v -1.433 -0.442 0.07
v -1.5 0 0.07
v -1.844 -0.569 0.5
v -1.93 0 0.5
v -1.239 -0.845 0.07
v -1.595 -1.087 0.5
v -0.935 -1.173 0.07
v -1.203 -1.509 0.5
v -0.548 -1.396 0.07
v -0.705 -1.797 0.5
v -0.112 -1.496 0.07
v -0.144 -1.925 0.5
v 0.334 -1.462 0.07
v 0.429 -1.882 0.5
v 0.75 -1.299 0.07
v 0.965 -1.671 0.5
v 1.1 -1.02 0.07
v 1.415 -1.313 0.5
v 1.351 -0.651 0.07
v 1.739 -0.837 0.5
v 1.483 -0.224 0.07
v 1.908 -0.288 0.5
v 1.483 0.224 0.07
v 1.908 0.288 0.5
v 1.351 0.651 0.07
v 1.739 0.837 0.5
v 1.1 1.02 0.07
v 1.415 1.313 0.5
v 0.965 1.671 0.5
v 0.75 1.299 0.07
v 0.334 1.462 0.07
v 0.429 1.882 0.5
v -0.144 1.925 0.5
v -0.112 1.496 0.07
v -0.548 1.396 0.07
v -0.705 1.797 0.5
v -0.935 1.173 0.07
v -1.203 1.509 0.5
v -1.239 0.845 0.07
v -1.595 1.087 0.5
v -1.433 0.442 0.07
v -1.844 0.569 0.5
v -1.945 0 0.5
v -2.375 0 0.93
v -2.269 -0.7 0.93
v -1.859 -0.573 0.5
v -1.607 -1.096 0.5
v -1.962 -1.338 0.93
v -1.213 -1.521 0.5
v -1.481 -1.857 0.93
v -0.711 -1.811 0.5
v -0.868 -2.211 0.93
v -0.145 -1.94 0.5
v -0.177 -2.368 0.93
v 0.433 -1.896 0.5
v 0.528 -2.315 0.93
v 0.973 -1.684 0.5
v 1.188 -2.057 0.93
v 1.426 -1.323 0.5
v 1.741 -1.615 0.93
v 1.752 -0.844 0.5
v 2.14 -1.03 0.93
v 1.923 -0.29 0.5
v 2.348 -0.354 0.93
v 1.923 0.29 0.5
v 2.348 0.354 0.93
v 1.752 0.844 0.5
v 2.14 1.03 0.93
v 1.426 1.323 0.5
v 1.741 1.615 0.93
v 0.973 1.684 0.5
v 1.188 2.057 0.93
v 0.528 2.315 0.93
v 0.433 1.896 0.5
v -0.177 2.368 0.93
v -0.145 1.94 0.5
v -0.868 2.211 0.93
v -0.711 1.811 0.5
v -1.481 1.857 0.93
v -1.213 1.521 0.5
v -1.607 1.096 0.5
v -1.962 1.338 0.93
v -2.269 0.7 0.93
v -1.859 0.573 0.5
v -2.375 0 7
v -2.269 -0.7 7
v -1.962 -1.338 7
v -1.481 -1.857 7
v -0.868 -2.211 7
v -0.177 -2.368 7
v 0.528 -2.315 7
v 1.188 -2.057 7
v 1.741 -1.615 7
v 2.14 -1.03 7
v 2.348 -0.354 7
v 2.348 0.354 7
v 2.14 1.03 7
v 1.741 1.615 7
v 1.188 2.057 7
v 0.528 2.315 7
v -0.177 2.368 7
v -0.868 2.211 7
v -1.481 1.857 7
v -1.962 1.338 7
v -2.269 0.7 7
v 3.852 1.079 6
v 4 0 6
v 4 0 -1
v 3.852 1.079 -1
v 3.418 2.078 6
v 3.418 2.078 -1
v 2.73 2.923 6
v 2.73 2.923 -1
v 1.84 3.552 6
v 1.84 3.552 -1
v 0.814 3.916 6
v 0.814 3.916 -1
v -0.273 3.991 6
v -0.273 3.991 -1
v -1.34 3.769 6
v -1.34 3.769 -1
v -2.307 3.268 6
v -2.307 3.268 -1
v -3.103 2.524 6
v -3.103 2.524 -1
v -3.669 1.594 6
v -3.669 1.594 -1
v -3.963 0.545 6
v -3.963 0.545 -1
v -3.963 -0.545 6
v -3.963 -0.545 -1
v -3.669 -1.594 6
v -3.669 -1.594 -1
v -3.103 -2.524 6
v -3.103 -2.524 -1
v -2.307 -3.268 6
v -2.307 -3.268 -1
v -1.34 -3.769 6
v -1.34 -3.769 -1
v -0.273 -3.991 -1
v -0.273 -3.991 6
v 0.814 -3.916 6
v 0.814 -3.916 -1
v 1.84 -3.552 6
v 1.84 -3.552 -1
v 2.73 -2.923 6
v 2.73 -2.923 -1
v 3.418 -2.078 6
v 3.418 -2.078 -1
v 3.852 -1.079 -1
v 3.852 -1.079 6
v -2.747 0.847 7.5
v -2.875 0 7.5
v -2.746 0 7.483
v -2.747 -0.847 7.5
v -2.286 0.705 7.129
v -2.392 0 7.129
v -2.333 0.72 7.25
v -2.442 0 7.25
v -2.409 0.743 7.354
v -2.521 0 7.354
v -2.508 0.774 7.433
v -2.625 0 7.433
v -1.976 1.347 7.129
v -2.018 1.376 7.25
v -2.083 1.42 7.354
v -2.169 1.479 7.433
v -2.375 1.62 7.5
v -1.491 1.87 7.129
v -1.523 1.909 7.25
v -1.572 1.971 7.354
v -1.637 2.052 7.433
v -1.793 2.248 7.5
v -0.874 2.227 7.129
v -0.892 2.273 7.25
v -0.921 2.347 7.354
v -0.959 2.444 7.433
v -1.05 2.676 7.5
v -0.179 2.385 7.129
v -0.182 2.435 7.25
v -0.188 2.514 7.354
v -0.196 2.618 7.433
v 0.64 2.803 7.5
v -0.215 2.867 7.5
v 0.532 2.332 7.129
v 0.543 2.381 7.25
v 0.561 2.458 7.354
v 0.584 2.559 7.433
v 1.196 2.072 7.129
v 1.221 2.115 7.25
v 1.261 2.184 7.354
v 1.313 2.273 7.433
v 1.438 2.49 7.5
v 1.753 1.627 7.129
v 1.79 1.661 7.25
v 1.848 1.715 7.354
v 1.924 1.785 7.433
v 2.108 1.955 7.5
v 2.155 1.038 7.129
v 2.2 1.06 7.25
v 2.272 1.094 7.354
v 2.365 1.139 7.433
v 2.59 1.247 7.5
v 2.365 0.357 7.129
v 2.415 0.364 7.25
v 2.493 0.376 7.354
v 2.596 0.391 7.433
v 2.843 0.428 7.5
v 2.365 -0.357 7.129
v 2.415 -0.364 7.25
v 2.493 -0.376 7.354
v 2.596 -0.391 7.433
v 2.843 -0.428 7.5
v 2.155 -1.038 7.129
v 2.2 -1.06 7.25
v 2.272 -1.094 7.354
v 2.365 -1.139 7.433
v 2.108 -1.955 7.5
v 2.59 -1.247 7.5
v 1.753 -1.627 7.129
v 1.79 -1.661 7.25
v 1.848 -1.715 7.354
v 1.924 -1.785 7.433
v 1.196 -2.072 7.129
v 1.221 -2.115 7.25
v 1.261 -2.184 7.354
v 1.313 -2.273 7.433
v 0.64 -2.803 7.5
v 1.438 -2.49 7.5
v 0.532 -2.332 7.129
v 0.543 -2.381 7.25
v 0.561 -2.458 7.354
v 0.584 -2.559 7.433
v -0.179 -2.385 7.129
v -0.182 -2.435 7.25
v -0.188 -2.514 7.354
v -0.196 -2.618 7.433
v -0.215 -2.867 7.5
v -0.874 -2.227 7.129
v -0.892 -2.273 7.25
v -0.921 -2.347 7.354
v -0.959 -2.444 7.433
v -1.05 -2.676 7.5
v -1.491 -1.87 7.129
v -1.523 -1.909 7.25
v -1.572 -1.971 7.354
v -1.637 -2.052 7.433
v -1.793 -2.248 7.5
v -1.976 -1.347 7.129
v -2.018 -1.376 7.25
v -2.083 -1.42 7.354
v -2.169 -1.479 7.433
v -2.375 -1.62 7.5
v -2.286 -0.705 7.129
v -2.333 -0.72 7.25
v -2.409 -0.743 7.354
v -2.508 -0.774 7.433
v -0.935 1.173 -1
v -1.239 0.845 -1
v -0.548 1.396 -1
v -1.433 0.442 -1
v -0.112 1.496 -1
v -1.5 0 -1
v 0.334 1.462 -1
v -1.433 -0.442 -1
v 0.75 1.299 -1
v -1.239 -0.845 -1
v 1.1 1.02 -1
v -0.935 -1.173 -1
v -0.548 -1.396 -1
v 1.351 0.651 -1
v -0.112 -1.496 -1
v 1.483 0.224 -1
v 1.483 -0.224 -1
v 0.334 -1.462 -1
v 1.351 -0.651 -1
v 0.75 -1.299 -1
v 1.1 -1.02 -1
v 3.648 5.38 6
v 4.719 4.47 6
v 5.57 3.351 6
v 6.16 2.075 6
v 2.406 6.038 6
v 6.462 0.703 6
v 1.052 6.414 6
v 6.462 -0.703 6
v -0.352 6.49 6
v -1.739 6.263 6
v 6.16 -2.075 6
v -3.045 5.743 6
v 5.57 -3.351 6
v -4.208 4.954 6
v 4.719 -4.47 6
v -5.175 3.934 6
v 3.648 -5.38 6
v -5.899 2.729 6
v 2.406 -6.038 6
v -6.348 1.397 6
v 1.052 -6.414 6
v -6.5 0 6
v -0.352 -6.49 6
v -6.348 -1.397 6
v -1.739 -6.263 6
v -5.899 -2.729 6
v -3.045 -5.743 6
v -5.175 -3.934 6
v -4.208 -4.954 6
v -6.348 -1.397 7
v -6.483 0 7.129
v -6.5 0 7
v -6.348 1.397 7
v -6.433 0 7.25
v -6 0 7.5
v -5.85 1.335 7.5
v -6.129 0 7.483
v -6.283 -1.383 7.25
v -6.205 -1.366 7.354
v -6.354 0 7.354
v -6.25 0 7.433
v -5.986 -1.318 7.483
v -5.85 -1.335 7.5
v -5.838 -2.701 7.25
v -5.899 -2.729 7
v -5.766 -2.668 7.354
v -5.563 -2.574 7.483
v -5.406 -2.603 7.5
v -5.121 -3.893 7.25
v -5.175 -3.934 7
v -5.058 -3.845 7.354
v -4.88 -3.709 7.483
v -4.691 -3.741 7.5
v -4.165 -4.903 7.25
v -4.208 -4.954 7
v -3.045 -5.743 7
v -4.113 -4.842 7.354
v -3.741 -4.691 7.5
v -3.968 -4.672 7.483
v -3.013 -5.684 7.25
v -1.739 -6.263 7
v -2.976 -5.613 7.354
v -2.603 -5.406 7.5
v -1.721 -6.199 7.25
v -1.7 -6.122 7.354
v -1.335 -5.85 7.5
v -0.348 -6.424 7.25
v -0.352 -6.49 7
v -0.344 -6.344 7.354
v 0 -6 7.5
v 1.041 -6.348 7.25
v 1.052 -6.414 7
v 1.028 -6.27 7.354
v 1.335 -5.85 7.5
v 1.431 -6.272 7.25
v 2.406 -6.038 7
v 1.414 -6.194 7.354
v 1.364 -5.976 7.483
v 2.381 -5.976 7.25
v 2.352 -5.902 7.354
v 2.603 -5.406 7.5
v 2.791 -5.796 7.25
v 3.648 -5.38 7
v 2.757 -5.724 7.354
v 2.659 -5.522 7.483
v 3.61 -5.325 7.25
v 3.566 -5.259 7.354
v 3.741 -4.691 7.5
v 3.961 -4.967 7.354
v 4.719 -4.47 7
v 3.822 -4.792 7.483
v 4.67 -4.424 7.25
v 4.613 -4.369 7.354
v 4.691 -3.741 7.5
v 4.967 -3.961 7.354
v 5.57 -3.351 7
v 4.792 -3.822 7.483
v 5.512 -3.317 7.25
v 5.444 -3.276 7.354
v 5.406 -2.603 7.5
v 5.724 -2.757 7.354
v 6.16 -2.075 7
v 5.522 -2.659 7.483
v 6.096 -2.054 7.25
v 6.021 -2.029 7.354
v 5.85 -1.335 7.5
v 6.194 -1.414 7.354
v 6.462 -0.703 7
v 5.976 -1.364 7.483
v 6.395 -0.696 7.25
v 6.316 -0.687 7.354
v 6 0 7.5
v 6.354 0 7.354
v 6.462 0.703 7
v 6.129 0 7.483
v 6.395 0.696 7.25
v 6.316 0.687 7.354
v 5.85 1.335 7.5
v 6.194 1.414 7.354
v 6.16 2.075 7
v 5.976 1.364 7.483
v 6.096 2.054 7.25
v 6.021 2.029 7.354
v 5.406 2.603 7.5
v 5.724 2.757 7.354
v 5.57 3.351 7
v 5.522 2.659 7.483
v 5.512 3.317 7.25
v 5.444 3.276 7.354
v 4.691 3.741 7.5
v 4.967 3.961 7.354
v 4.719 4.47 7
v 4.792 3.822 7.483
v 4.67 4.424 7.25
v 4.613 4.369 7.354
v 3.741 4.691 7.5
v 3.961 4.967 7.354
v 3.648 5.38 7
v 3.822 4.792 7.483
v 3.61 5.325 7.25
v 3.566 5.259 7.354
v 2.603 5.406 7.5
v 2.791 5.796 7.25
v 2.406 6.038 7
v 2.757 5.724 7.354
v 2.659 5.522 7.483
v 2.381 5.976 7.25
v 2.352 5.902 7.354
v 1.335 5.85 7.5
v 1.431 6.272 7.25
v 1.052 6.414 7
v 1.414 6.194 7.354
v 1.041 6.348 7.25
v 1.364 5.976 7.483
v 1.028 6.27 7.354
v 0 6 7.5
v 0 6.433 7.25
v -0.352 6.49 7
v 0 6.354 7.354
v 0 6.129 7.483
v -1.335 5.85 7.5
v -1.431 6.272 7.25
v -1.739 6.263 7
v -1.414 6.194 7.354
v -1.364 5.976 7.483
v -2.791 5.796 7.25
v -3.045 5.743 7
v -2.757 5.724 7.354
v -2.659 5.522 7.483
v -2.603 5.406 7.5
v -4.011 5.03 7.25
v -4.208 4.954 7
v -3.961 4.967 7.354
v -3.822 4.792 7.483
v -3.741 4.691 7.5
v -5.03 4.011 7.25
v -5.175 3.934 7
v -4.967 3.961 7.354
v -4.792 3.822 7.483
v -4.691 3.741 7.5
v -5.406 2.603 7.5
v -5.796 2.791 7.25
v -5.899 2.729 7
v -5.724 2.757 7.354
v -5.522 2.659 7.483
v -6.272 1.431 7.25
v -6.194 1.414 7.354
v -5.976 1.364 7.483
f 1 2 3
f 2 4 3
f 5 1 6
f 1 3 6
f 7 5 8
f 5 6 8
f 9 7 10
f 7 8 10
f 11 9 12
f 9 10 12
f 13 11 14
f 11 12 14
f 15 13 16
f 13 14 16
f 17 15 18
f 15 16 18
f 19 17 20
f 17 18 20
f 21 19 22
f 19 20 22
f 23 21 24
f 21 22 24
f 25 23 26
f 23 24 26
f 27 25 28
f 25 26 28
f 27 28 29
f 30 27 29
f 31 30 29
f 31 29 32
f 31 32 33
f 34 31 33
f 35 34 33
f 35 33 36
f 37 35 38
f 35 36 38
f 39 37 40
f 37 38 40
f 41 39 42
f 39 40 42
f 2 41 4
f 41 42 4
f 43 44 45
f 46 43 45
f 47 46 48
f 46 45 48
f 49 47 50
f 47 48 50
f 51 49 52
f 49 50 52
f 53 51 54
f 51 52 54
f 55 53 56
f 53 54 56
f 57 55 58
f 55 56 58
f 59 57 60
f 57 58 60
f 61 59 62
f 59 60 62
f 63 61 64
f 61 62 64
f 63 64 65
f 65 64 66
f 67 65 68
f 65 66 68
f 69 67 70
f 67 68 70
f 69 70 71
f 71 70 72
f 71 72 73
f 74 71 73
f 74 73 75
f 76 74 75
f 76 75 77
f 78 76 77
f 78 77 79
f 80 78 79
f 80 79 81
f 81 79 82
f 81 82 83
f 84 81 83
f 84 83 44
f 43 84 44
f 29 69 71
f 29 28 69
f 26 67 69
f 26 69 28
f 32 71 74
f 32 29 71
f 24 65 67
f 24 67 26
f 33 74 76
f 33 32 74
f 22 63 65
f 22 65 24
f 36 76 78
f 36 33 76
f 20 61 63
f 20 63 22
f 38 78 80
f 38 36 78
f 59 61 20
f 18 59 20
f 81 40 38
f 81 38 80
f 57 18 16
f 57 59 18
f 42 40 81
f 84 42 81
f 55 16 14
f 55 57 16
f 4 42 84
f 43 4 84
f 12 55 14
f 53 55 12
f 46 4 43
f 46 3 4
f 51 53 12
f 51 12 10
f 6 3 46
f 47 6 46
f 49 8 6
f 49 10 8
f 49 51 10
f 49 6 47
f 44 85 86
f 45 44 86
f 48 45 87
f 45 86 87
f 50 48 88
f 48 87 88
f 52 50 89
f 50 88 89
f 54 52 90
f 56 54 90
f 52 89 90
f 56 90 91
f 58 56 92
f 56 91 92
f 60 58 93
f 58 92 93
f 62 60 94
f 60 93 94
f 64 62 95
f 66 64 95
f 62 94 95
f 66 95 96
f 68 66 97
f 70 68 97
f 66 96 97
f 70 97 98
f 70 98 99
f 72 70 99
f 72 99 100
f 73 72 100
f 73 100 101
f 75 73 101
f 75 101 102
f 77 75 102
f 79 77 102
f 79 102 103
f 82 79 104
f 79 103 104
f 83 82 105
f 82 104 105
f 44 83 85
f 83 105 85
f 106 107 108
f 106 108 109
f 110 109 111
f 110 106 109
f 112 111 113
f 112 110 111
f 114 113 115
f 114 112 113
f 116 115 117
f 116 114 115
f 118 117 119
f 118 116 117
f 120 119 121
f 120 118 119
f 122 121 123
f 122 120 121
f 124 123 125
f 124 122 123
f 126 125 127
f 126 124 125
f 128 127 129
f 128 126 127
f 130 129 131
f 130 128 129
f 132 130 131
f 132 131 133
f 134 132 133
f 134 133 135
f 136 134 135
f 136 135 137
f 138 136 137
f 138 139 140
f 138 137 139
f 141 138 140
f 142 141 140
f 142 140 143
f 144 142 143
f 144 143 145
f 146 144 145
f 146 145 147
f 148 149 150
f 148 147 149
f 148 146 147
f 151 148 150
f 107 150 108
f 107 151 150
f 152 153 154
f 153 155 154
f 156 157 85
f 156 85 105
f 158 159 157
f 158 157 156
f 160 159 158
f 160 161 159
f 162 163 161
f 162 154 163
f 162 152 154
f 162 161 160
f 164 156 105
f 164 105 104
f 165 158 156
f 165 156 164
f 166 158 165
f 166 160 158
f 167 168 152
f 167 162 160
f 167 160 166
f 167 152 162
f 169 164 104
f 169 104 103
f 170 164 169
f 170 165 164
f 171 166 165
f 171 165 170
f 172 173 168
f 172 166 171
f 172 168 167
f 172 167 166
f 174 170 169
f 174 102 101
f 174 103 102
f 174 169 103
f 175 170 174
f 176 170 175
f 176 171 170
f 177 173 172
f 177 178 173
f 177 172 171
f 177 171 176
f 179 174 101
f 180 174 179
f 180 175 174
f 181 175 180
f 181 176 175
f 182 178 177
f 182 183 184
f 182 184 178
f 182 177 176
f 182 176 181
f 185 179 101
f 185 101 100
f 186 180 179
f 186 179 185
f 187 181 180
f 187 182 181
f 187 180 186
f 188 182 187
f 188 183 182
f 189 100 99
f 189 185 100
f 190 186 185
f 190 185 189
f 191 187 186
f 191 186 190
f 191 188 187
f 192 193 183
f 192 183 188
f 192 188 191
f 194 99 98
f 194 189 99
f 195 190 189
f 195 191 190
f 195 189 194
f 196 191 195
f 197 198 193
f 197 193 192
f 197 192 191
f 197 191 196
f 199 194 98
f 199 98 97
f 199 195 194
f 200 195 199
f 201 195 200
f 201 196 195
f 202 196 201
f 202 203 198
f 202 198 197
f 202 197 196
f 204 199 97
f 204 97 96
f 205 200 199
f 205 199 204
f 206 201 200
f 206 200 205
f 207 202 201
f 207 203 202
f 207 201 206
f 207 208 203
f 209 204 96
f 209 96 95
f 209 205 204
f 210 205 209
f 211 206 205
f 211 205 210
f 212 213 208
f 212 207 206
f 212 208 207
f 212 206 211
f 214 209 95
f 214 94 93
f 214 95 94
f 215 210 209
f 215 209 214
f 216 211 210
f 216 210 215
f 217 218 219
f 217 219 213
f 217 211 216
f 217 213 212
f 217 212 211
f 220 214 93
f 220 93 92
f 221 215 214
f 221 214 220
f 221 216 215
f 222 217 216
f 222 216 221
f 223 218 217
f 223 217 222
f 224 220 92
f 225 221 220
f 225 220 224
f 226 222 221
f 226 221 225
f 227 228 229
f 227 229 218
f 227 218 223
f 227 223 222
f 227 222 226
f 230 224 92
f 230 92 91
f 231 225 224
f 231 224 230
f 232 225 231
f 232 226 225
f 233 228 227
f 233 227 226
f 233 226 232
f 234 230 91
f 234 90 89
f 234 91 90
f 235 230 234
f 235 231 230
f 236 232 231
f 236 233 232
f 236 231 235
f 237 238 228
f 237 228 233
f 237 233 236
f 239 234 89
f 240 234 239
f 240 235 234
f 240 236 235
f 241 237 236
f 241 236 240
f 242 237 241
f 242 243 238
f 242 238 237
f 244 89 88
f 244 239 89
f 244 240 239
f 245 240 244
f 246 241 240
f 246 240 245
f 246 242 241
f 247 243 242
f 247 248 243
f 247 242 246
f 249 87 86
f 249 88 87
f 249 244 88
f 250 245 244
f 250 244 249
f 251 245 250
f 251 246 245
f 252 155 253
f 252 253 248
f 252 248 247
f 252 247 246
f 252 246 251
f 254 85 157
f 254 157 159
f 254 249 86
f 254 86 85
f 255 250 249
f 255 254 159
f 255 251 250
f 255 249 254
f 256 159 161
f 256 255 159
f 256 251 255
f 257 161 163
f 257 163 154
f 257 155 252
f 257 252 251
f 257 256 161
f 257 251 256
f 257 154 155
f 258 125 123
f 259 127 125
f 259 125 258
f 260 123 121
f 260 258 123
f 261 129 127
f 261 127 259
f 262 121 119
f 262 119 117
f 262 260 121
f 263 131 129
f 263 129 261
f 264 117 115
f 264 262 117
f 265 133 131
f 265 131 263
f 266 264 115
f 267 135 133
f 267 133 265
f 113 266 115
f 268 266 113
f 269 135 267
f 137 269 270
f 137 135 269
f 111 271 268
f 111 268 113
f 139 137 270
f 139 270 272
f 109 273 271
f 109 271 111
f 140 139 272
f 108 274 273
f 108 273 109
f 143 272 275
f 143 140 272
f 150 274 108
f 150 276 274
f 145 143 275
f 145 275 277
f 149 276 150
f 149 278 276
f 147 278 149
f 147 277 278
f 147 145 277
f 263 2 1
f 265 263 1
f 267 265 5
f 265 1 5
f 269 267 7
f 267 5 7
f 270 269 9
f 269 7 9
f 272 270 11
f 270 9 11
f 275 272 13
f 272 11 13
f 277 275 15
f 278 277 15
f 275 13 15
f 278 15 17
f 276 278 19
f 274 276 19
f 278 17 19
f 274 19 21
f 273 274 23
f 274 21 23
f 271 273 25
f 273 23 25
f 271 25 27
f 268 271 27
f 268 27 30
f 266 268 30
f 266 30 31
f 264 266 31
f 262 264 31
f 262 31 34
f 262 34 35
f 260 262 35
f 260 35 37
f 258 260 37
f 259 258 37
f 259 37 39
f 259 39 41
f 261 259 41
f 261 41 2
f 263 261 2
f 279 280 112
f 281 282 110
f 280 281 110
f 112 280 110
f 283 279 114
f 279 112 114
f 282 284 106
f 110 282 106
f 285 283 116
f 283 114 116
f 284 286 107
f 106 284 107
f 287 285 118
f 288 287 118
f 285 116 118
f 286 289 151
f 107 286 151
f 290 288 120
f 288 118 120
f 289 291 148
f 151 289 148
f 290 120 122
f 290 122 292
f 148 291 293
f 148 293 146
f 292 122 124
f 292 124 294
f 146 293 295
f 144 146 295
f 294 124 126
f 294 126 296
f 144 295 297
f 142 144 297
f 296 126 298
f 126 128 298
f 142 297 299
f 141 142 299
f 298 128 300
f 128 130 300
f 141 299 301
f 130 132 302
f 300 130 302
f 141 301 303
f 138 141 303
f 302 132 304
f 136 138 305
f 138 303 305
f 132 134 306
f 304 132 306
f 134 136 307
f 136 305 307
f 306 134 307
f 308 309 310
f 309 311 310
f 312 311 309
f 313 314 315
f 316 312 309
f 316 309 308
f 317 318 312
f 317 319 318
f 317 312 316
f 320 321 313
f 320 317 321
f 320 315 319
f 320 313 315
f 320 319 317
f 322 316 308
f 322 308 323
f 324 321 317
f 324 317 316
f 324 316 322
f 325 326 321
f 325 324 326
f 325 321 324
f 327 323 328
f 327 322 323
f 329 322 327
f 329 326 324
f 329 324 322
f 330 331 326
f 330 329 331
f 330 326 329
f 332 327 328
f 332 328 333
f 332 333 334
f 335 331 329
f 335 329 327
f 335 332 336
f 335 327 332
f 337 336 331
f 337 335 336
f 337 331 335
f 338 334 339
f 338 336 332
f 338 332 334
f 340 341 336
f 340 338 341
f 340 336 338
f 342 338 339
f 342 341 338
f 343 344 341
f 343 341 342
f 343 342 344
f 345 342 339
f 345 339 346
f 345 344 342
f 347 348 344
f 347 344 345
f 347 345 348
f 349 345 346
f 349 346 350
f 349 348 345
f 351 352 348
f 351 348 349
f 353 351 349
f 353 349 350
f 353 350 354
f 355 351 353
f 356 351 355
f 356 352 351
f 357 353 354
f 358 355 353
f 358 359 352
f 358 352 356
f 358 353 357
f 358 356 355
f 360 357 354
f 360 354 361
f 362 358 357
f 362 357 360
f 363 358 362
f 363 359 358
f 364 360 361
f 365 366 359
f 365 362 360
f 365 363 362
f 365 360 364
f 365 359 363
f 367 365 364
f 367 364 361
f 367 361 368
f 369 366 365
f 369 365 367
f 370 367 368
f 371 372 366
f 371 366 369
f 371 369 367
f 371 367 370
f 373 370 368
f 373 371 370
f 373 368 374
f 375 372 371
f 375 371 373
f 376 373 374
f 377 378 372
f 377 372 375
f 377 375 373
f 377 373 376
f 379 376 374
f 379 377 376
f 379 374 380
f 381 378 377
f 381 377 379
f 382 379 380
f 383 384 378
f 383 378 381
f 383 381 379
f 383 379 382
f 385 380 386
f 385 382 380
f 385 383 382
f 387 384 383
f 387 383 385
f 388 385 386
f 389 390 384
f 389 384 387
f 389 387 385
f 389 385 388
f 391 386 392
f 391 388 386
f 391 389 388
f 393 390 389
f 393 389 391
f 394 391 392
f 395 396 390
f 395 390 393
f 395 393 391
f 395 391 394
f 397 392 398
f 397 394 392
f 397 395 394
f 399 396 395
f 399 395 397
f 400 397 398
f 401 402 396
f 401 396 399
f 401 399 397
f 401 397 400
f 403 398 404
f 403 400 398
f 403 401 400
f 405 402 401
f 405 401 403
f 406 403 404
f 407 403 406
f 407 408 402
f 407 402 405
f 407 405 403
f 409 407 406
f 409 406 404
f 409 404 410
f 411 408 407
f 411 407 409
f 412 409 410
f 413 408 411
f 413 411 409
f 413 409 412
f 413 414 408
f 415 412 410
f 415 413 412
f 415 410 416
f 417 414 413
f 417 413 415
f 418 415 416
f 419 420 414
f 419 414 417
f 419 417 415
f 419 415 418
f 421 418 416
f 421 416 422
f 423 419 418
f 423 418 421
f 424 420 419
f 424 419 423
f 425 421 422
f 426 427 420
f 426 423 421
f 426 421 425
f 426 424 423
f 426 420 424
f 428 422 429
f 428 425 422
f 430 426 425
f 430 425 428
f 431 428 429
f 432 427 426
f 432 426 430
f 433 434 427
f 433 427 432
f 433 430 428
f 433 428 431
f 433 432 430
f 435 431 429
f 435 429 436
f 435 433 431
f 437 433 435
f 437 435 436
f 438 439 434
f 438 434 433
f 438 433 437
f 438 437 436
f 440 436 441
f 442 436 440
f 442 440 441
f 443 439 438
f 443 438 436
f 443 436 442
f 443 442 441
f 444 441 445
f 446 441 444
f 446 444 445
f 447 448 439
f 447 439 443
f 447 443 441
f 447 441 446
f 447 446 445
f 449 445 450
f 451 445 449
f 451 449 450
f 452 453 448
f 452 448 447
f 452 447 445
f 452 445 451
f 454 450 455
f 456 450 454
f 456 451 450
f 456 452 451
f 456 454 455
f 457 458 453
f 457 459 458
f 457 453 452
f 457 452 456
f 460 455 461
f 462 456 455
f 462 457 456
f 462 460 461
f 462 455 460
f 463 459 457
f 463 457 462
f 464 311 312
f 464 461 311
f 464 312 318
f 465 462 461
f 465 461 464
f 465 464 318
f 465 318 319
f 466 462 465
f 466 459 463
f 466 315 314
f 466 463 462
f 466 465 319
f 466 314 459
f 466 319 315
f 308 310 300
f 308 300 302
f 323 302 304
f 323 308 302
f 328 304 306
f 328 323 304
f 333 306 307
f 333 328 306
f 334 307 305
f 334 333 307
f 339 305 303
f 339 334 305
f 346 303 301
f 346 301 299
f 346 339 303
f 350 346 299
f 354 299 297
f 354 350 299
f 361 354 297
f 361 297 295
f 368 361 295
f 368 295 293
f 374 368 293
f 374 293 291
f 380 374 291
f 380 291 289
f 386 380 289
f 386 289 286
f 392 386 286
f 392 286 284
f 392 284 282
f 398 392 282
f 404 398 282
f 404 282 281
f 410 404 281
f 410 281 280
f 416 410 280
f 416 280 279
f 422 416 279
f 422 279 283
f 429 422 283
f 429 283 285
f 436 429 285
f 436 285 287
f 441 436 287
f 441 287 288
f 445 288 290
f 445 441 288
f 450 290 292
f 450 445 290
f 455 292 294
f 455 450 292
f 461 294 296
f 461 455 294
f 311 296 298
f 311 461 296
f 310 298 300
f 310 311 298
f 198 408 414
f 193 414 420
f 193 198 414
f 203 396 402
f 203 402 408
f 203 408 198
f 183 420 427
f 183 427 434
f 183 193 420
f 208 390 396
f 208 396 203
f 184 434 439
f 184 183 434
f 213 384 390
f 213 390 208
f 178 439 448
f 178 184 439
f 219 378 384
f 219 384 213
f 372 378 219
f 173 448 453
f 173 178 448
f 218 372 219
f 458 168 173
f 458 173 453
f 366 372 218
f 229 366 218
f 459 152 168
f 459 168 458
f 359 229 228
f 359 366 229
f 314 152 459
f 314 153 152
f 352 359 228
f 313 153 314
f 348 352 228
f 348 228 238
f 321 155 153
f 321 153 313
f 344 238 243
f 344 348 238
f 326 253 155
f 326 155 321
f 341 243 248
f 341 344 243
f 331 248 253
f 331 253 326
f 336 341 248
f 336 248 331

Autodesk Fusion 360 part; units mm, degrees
sketch "Sketch1" plane through (0, 0, 0) normal (0, 0, 1) x (1, 0, 0)
  circle A0 centre (0, 0) radius 4
  dimension "d1" = 8
extrude "Extrude1" add sketch "Sketch1" along normal blind 8
sketch "Sketch2" plane through (0, 0, 8) normal (0, 0, 1) x (-1, 0, 0)
  circle A0 centre (0, 0) radius 4
  circle A1 centre (0, 0) radius 2.375
  dimension "d4" = 4.75
extrude "Extrude2" cut sketch "Sketch2" against normal blind 3 contours A1
sketch "Sketch3" plane through (0, 0, 5) normal (0, 0, 1) x (-1, 0, 0)
  circle A0 centre (0, 0) radius 2.375
  circle A1 centre (0, 0) radius 1.5
  dimension "d7" = 3
extrude "Extrude3" cut sketch "Sketch3" against normal blind 9 contours A1
sketch "Sketch4" plane through (0, 0, 8) normal (0, 0, 1) x (-1, 0, 0)
  circle A0 centre (0, 0) radius 2.375
  circle A1 centre (0, 0) radius 4
  circle A2 centre (0, 0) radius 6.5
  dimension "d10" = 13
extrude "Extrude4" add sketch "Sketch4" against normal blind 2 contours A2
extrude "Extrude5" add 1 faces at (3.1462, -0.2732, 0) along direction (0, 0, -1) blind 2
sketch "Sketch5" plane through (0, 0, -2) normal (0, 0, -1) x (1, 0, 0)
  circle A0 centre (0, 0) radius 1.5
  circle A1 centre (0, 0) radius 4
  circle A2 centre (0, 0) radius 3.2
  dimension "d18" = 6.4
extrude "Extrude6" cut sketch "Sketch5" against normal blind 0.5 contours A1
extrude "Extrude7" add 1 faces at (2.6214, 0.159, -2) along direction (0, 0, -1) blind 0.5
extrude "Extrude8" add 1 faces at (3.7184, 0.1987, -1.5) along direction (0, 0, -1) blind 0.5
extrude "Extrude9" cut 1 faces at (-2.0745, 0.118, 5) along direction (0, 0, -1) blind 3
extrude "Extrude10" cut 1 faces at (-2.0745, 0.118, 2) along direction (0, 0, -1) blind 1.5
extrude "Extrude11" add 1 faces at (3.7184, 0.1987, -2) along direction (0, 0, -1) blind 0.5
chamfer "Chamfer3" distance 0.43 angle 45 2 edges at (1.3985, 0.5424, 0.5) (2.2143, -0.8588, 0.5)
extrude "Extrude12" cut 1 faces at (3.1462, 0.2732, -2.5) along direction (0, 0, 1) blind 1.5
extrude "Extrude13" cut 1 faces at (-5.092, 0.4409, 8) along direction (0, 0, -1) blind 0.5
fillet "Fillet2" radius 0.5 2 edges at (2.2143, 0.8588, 7.5) (6.0601, -2.3505, 7.5)
